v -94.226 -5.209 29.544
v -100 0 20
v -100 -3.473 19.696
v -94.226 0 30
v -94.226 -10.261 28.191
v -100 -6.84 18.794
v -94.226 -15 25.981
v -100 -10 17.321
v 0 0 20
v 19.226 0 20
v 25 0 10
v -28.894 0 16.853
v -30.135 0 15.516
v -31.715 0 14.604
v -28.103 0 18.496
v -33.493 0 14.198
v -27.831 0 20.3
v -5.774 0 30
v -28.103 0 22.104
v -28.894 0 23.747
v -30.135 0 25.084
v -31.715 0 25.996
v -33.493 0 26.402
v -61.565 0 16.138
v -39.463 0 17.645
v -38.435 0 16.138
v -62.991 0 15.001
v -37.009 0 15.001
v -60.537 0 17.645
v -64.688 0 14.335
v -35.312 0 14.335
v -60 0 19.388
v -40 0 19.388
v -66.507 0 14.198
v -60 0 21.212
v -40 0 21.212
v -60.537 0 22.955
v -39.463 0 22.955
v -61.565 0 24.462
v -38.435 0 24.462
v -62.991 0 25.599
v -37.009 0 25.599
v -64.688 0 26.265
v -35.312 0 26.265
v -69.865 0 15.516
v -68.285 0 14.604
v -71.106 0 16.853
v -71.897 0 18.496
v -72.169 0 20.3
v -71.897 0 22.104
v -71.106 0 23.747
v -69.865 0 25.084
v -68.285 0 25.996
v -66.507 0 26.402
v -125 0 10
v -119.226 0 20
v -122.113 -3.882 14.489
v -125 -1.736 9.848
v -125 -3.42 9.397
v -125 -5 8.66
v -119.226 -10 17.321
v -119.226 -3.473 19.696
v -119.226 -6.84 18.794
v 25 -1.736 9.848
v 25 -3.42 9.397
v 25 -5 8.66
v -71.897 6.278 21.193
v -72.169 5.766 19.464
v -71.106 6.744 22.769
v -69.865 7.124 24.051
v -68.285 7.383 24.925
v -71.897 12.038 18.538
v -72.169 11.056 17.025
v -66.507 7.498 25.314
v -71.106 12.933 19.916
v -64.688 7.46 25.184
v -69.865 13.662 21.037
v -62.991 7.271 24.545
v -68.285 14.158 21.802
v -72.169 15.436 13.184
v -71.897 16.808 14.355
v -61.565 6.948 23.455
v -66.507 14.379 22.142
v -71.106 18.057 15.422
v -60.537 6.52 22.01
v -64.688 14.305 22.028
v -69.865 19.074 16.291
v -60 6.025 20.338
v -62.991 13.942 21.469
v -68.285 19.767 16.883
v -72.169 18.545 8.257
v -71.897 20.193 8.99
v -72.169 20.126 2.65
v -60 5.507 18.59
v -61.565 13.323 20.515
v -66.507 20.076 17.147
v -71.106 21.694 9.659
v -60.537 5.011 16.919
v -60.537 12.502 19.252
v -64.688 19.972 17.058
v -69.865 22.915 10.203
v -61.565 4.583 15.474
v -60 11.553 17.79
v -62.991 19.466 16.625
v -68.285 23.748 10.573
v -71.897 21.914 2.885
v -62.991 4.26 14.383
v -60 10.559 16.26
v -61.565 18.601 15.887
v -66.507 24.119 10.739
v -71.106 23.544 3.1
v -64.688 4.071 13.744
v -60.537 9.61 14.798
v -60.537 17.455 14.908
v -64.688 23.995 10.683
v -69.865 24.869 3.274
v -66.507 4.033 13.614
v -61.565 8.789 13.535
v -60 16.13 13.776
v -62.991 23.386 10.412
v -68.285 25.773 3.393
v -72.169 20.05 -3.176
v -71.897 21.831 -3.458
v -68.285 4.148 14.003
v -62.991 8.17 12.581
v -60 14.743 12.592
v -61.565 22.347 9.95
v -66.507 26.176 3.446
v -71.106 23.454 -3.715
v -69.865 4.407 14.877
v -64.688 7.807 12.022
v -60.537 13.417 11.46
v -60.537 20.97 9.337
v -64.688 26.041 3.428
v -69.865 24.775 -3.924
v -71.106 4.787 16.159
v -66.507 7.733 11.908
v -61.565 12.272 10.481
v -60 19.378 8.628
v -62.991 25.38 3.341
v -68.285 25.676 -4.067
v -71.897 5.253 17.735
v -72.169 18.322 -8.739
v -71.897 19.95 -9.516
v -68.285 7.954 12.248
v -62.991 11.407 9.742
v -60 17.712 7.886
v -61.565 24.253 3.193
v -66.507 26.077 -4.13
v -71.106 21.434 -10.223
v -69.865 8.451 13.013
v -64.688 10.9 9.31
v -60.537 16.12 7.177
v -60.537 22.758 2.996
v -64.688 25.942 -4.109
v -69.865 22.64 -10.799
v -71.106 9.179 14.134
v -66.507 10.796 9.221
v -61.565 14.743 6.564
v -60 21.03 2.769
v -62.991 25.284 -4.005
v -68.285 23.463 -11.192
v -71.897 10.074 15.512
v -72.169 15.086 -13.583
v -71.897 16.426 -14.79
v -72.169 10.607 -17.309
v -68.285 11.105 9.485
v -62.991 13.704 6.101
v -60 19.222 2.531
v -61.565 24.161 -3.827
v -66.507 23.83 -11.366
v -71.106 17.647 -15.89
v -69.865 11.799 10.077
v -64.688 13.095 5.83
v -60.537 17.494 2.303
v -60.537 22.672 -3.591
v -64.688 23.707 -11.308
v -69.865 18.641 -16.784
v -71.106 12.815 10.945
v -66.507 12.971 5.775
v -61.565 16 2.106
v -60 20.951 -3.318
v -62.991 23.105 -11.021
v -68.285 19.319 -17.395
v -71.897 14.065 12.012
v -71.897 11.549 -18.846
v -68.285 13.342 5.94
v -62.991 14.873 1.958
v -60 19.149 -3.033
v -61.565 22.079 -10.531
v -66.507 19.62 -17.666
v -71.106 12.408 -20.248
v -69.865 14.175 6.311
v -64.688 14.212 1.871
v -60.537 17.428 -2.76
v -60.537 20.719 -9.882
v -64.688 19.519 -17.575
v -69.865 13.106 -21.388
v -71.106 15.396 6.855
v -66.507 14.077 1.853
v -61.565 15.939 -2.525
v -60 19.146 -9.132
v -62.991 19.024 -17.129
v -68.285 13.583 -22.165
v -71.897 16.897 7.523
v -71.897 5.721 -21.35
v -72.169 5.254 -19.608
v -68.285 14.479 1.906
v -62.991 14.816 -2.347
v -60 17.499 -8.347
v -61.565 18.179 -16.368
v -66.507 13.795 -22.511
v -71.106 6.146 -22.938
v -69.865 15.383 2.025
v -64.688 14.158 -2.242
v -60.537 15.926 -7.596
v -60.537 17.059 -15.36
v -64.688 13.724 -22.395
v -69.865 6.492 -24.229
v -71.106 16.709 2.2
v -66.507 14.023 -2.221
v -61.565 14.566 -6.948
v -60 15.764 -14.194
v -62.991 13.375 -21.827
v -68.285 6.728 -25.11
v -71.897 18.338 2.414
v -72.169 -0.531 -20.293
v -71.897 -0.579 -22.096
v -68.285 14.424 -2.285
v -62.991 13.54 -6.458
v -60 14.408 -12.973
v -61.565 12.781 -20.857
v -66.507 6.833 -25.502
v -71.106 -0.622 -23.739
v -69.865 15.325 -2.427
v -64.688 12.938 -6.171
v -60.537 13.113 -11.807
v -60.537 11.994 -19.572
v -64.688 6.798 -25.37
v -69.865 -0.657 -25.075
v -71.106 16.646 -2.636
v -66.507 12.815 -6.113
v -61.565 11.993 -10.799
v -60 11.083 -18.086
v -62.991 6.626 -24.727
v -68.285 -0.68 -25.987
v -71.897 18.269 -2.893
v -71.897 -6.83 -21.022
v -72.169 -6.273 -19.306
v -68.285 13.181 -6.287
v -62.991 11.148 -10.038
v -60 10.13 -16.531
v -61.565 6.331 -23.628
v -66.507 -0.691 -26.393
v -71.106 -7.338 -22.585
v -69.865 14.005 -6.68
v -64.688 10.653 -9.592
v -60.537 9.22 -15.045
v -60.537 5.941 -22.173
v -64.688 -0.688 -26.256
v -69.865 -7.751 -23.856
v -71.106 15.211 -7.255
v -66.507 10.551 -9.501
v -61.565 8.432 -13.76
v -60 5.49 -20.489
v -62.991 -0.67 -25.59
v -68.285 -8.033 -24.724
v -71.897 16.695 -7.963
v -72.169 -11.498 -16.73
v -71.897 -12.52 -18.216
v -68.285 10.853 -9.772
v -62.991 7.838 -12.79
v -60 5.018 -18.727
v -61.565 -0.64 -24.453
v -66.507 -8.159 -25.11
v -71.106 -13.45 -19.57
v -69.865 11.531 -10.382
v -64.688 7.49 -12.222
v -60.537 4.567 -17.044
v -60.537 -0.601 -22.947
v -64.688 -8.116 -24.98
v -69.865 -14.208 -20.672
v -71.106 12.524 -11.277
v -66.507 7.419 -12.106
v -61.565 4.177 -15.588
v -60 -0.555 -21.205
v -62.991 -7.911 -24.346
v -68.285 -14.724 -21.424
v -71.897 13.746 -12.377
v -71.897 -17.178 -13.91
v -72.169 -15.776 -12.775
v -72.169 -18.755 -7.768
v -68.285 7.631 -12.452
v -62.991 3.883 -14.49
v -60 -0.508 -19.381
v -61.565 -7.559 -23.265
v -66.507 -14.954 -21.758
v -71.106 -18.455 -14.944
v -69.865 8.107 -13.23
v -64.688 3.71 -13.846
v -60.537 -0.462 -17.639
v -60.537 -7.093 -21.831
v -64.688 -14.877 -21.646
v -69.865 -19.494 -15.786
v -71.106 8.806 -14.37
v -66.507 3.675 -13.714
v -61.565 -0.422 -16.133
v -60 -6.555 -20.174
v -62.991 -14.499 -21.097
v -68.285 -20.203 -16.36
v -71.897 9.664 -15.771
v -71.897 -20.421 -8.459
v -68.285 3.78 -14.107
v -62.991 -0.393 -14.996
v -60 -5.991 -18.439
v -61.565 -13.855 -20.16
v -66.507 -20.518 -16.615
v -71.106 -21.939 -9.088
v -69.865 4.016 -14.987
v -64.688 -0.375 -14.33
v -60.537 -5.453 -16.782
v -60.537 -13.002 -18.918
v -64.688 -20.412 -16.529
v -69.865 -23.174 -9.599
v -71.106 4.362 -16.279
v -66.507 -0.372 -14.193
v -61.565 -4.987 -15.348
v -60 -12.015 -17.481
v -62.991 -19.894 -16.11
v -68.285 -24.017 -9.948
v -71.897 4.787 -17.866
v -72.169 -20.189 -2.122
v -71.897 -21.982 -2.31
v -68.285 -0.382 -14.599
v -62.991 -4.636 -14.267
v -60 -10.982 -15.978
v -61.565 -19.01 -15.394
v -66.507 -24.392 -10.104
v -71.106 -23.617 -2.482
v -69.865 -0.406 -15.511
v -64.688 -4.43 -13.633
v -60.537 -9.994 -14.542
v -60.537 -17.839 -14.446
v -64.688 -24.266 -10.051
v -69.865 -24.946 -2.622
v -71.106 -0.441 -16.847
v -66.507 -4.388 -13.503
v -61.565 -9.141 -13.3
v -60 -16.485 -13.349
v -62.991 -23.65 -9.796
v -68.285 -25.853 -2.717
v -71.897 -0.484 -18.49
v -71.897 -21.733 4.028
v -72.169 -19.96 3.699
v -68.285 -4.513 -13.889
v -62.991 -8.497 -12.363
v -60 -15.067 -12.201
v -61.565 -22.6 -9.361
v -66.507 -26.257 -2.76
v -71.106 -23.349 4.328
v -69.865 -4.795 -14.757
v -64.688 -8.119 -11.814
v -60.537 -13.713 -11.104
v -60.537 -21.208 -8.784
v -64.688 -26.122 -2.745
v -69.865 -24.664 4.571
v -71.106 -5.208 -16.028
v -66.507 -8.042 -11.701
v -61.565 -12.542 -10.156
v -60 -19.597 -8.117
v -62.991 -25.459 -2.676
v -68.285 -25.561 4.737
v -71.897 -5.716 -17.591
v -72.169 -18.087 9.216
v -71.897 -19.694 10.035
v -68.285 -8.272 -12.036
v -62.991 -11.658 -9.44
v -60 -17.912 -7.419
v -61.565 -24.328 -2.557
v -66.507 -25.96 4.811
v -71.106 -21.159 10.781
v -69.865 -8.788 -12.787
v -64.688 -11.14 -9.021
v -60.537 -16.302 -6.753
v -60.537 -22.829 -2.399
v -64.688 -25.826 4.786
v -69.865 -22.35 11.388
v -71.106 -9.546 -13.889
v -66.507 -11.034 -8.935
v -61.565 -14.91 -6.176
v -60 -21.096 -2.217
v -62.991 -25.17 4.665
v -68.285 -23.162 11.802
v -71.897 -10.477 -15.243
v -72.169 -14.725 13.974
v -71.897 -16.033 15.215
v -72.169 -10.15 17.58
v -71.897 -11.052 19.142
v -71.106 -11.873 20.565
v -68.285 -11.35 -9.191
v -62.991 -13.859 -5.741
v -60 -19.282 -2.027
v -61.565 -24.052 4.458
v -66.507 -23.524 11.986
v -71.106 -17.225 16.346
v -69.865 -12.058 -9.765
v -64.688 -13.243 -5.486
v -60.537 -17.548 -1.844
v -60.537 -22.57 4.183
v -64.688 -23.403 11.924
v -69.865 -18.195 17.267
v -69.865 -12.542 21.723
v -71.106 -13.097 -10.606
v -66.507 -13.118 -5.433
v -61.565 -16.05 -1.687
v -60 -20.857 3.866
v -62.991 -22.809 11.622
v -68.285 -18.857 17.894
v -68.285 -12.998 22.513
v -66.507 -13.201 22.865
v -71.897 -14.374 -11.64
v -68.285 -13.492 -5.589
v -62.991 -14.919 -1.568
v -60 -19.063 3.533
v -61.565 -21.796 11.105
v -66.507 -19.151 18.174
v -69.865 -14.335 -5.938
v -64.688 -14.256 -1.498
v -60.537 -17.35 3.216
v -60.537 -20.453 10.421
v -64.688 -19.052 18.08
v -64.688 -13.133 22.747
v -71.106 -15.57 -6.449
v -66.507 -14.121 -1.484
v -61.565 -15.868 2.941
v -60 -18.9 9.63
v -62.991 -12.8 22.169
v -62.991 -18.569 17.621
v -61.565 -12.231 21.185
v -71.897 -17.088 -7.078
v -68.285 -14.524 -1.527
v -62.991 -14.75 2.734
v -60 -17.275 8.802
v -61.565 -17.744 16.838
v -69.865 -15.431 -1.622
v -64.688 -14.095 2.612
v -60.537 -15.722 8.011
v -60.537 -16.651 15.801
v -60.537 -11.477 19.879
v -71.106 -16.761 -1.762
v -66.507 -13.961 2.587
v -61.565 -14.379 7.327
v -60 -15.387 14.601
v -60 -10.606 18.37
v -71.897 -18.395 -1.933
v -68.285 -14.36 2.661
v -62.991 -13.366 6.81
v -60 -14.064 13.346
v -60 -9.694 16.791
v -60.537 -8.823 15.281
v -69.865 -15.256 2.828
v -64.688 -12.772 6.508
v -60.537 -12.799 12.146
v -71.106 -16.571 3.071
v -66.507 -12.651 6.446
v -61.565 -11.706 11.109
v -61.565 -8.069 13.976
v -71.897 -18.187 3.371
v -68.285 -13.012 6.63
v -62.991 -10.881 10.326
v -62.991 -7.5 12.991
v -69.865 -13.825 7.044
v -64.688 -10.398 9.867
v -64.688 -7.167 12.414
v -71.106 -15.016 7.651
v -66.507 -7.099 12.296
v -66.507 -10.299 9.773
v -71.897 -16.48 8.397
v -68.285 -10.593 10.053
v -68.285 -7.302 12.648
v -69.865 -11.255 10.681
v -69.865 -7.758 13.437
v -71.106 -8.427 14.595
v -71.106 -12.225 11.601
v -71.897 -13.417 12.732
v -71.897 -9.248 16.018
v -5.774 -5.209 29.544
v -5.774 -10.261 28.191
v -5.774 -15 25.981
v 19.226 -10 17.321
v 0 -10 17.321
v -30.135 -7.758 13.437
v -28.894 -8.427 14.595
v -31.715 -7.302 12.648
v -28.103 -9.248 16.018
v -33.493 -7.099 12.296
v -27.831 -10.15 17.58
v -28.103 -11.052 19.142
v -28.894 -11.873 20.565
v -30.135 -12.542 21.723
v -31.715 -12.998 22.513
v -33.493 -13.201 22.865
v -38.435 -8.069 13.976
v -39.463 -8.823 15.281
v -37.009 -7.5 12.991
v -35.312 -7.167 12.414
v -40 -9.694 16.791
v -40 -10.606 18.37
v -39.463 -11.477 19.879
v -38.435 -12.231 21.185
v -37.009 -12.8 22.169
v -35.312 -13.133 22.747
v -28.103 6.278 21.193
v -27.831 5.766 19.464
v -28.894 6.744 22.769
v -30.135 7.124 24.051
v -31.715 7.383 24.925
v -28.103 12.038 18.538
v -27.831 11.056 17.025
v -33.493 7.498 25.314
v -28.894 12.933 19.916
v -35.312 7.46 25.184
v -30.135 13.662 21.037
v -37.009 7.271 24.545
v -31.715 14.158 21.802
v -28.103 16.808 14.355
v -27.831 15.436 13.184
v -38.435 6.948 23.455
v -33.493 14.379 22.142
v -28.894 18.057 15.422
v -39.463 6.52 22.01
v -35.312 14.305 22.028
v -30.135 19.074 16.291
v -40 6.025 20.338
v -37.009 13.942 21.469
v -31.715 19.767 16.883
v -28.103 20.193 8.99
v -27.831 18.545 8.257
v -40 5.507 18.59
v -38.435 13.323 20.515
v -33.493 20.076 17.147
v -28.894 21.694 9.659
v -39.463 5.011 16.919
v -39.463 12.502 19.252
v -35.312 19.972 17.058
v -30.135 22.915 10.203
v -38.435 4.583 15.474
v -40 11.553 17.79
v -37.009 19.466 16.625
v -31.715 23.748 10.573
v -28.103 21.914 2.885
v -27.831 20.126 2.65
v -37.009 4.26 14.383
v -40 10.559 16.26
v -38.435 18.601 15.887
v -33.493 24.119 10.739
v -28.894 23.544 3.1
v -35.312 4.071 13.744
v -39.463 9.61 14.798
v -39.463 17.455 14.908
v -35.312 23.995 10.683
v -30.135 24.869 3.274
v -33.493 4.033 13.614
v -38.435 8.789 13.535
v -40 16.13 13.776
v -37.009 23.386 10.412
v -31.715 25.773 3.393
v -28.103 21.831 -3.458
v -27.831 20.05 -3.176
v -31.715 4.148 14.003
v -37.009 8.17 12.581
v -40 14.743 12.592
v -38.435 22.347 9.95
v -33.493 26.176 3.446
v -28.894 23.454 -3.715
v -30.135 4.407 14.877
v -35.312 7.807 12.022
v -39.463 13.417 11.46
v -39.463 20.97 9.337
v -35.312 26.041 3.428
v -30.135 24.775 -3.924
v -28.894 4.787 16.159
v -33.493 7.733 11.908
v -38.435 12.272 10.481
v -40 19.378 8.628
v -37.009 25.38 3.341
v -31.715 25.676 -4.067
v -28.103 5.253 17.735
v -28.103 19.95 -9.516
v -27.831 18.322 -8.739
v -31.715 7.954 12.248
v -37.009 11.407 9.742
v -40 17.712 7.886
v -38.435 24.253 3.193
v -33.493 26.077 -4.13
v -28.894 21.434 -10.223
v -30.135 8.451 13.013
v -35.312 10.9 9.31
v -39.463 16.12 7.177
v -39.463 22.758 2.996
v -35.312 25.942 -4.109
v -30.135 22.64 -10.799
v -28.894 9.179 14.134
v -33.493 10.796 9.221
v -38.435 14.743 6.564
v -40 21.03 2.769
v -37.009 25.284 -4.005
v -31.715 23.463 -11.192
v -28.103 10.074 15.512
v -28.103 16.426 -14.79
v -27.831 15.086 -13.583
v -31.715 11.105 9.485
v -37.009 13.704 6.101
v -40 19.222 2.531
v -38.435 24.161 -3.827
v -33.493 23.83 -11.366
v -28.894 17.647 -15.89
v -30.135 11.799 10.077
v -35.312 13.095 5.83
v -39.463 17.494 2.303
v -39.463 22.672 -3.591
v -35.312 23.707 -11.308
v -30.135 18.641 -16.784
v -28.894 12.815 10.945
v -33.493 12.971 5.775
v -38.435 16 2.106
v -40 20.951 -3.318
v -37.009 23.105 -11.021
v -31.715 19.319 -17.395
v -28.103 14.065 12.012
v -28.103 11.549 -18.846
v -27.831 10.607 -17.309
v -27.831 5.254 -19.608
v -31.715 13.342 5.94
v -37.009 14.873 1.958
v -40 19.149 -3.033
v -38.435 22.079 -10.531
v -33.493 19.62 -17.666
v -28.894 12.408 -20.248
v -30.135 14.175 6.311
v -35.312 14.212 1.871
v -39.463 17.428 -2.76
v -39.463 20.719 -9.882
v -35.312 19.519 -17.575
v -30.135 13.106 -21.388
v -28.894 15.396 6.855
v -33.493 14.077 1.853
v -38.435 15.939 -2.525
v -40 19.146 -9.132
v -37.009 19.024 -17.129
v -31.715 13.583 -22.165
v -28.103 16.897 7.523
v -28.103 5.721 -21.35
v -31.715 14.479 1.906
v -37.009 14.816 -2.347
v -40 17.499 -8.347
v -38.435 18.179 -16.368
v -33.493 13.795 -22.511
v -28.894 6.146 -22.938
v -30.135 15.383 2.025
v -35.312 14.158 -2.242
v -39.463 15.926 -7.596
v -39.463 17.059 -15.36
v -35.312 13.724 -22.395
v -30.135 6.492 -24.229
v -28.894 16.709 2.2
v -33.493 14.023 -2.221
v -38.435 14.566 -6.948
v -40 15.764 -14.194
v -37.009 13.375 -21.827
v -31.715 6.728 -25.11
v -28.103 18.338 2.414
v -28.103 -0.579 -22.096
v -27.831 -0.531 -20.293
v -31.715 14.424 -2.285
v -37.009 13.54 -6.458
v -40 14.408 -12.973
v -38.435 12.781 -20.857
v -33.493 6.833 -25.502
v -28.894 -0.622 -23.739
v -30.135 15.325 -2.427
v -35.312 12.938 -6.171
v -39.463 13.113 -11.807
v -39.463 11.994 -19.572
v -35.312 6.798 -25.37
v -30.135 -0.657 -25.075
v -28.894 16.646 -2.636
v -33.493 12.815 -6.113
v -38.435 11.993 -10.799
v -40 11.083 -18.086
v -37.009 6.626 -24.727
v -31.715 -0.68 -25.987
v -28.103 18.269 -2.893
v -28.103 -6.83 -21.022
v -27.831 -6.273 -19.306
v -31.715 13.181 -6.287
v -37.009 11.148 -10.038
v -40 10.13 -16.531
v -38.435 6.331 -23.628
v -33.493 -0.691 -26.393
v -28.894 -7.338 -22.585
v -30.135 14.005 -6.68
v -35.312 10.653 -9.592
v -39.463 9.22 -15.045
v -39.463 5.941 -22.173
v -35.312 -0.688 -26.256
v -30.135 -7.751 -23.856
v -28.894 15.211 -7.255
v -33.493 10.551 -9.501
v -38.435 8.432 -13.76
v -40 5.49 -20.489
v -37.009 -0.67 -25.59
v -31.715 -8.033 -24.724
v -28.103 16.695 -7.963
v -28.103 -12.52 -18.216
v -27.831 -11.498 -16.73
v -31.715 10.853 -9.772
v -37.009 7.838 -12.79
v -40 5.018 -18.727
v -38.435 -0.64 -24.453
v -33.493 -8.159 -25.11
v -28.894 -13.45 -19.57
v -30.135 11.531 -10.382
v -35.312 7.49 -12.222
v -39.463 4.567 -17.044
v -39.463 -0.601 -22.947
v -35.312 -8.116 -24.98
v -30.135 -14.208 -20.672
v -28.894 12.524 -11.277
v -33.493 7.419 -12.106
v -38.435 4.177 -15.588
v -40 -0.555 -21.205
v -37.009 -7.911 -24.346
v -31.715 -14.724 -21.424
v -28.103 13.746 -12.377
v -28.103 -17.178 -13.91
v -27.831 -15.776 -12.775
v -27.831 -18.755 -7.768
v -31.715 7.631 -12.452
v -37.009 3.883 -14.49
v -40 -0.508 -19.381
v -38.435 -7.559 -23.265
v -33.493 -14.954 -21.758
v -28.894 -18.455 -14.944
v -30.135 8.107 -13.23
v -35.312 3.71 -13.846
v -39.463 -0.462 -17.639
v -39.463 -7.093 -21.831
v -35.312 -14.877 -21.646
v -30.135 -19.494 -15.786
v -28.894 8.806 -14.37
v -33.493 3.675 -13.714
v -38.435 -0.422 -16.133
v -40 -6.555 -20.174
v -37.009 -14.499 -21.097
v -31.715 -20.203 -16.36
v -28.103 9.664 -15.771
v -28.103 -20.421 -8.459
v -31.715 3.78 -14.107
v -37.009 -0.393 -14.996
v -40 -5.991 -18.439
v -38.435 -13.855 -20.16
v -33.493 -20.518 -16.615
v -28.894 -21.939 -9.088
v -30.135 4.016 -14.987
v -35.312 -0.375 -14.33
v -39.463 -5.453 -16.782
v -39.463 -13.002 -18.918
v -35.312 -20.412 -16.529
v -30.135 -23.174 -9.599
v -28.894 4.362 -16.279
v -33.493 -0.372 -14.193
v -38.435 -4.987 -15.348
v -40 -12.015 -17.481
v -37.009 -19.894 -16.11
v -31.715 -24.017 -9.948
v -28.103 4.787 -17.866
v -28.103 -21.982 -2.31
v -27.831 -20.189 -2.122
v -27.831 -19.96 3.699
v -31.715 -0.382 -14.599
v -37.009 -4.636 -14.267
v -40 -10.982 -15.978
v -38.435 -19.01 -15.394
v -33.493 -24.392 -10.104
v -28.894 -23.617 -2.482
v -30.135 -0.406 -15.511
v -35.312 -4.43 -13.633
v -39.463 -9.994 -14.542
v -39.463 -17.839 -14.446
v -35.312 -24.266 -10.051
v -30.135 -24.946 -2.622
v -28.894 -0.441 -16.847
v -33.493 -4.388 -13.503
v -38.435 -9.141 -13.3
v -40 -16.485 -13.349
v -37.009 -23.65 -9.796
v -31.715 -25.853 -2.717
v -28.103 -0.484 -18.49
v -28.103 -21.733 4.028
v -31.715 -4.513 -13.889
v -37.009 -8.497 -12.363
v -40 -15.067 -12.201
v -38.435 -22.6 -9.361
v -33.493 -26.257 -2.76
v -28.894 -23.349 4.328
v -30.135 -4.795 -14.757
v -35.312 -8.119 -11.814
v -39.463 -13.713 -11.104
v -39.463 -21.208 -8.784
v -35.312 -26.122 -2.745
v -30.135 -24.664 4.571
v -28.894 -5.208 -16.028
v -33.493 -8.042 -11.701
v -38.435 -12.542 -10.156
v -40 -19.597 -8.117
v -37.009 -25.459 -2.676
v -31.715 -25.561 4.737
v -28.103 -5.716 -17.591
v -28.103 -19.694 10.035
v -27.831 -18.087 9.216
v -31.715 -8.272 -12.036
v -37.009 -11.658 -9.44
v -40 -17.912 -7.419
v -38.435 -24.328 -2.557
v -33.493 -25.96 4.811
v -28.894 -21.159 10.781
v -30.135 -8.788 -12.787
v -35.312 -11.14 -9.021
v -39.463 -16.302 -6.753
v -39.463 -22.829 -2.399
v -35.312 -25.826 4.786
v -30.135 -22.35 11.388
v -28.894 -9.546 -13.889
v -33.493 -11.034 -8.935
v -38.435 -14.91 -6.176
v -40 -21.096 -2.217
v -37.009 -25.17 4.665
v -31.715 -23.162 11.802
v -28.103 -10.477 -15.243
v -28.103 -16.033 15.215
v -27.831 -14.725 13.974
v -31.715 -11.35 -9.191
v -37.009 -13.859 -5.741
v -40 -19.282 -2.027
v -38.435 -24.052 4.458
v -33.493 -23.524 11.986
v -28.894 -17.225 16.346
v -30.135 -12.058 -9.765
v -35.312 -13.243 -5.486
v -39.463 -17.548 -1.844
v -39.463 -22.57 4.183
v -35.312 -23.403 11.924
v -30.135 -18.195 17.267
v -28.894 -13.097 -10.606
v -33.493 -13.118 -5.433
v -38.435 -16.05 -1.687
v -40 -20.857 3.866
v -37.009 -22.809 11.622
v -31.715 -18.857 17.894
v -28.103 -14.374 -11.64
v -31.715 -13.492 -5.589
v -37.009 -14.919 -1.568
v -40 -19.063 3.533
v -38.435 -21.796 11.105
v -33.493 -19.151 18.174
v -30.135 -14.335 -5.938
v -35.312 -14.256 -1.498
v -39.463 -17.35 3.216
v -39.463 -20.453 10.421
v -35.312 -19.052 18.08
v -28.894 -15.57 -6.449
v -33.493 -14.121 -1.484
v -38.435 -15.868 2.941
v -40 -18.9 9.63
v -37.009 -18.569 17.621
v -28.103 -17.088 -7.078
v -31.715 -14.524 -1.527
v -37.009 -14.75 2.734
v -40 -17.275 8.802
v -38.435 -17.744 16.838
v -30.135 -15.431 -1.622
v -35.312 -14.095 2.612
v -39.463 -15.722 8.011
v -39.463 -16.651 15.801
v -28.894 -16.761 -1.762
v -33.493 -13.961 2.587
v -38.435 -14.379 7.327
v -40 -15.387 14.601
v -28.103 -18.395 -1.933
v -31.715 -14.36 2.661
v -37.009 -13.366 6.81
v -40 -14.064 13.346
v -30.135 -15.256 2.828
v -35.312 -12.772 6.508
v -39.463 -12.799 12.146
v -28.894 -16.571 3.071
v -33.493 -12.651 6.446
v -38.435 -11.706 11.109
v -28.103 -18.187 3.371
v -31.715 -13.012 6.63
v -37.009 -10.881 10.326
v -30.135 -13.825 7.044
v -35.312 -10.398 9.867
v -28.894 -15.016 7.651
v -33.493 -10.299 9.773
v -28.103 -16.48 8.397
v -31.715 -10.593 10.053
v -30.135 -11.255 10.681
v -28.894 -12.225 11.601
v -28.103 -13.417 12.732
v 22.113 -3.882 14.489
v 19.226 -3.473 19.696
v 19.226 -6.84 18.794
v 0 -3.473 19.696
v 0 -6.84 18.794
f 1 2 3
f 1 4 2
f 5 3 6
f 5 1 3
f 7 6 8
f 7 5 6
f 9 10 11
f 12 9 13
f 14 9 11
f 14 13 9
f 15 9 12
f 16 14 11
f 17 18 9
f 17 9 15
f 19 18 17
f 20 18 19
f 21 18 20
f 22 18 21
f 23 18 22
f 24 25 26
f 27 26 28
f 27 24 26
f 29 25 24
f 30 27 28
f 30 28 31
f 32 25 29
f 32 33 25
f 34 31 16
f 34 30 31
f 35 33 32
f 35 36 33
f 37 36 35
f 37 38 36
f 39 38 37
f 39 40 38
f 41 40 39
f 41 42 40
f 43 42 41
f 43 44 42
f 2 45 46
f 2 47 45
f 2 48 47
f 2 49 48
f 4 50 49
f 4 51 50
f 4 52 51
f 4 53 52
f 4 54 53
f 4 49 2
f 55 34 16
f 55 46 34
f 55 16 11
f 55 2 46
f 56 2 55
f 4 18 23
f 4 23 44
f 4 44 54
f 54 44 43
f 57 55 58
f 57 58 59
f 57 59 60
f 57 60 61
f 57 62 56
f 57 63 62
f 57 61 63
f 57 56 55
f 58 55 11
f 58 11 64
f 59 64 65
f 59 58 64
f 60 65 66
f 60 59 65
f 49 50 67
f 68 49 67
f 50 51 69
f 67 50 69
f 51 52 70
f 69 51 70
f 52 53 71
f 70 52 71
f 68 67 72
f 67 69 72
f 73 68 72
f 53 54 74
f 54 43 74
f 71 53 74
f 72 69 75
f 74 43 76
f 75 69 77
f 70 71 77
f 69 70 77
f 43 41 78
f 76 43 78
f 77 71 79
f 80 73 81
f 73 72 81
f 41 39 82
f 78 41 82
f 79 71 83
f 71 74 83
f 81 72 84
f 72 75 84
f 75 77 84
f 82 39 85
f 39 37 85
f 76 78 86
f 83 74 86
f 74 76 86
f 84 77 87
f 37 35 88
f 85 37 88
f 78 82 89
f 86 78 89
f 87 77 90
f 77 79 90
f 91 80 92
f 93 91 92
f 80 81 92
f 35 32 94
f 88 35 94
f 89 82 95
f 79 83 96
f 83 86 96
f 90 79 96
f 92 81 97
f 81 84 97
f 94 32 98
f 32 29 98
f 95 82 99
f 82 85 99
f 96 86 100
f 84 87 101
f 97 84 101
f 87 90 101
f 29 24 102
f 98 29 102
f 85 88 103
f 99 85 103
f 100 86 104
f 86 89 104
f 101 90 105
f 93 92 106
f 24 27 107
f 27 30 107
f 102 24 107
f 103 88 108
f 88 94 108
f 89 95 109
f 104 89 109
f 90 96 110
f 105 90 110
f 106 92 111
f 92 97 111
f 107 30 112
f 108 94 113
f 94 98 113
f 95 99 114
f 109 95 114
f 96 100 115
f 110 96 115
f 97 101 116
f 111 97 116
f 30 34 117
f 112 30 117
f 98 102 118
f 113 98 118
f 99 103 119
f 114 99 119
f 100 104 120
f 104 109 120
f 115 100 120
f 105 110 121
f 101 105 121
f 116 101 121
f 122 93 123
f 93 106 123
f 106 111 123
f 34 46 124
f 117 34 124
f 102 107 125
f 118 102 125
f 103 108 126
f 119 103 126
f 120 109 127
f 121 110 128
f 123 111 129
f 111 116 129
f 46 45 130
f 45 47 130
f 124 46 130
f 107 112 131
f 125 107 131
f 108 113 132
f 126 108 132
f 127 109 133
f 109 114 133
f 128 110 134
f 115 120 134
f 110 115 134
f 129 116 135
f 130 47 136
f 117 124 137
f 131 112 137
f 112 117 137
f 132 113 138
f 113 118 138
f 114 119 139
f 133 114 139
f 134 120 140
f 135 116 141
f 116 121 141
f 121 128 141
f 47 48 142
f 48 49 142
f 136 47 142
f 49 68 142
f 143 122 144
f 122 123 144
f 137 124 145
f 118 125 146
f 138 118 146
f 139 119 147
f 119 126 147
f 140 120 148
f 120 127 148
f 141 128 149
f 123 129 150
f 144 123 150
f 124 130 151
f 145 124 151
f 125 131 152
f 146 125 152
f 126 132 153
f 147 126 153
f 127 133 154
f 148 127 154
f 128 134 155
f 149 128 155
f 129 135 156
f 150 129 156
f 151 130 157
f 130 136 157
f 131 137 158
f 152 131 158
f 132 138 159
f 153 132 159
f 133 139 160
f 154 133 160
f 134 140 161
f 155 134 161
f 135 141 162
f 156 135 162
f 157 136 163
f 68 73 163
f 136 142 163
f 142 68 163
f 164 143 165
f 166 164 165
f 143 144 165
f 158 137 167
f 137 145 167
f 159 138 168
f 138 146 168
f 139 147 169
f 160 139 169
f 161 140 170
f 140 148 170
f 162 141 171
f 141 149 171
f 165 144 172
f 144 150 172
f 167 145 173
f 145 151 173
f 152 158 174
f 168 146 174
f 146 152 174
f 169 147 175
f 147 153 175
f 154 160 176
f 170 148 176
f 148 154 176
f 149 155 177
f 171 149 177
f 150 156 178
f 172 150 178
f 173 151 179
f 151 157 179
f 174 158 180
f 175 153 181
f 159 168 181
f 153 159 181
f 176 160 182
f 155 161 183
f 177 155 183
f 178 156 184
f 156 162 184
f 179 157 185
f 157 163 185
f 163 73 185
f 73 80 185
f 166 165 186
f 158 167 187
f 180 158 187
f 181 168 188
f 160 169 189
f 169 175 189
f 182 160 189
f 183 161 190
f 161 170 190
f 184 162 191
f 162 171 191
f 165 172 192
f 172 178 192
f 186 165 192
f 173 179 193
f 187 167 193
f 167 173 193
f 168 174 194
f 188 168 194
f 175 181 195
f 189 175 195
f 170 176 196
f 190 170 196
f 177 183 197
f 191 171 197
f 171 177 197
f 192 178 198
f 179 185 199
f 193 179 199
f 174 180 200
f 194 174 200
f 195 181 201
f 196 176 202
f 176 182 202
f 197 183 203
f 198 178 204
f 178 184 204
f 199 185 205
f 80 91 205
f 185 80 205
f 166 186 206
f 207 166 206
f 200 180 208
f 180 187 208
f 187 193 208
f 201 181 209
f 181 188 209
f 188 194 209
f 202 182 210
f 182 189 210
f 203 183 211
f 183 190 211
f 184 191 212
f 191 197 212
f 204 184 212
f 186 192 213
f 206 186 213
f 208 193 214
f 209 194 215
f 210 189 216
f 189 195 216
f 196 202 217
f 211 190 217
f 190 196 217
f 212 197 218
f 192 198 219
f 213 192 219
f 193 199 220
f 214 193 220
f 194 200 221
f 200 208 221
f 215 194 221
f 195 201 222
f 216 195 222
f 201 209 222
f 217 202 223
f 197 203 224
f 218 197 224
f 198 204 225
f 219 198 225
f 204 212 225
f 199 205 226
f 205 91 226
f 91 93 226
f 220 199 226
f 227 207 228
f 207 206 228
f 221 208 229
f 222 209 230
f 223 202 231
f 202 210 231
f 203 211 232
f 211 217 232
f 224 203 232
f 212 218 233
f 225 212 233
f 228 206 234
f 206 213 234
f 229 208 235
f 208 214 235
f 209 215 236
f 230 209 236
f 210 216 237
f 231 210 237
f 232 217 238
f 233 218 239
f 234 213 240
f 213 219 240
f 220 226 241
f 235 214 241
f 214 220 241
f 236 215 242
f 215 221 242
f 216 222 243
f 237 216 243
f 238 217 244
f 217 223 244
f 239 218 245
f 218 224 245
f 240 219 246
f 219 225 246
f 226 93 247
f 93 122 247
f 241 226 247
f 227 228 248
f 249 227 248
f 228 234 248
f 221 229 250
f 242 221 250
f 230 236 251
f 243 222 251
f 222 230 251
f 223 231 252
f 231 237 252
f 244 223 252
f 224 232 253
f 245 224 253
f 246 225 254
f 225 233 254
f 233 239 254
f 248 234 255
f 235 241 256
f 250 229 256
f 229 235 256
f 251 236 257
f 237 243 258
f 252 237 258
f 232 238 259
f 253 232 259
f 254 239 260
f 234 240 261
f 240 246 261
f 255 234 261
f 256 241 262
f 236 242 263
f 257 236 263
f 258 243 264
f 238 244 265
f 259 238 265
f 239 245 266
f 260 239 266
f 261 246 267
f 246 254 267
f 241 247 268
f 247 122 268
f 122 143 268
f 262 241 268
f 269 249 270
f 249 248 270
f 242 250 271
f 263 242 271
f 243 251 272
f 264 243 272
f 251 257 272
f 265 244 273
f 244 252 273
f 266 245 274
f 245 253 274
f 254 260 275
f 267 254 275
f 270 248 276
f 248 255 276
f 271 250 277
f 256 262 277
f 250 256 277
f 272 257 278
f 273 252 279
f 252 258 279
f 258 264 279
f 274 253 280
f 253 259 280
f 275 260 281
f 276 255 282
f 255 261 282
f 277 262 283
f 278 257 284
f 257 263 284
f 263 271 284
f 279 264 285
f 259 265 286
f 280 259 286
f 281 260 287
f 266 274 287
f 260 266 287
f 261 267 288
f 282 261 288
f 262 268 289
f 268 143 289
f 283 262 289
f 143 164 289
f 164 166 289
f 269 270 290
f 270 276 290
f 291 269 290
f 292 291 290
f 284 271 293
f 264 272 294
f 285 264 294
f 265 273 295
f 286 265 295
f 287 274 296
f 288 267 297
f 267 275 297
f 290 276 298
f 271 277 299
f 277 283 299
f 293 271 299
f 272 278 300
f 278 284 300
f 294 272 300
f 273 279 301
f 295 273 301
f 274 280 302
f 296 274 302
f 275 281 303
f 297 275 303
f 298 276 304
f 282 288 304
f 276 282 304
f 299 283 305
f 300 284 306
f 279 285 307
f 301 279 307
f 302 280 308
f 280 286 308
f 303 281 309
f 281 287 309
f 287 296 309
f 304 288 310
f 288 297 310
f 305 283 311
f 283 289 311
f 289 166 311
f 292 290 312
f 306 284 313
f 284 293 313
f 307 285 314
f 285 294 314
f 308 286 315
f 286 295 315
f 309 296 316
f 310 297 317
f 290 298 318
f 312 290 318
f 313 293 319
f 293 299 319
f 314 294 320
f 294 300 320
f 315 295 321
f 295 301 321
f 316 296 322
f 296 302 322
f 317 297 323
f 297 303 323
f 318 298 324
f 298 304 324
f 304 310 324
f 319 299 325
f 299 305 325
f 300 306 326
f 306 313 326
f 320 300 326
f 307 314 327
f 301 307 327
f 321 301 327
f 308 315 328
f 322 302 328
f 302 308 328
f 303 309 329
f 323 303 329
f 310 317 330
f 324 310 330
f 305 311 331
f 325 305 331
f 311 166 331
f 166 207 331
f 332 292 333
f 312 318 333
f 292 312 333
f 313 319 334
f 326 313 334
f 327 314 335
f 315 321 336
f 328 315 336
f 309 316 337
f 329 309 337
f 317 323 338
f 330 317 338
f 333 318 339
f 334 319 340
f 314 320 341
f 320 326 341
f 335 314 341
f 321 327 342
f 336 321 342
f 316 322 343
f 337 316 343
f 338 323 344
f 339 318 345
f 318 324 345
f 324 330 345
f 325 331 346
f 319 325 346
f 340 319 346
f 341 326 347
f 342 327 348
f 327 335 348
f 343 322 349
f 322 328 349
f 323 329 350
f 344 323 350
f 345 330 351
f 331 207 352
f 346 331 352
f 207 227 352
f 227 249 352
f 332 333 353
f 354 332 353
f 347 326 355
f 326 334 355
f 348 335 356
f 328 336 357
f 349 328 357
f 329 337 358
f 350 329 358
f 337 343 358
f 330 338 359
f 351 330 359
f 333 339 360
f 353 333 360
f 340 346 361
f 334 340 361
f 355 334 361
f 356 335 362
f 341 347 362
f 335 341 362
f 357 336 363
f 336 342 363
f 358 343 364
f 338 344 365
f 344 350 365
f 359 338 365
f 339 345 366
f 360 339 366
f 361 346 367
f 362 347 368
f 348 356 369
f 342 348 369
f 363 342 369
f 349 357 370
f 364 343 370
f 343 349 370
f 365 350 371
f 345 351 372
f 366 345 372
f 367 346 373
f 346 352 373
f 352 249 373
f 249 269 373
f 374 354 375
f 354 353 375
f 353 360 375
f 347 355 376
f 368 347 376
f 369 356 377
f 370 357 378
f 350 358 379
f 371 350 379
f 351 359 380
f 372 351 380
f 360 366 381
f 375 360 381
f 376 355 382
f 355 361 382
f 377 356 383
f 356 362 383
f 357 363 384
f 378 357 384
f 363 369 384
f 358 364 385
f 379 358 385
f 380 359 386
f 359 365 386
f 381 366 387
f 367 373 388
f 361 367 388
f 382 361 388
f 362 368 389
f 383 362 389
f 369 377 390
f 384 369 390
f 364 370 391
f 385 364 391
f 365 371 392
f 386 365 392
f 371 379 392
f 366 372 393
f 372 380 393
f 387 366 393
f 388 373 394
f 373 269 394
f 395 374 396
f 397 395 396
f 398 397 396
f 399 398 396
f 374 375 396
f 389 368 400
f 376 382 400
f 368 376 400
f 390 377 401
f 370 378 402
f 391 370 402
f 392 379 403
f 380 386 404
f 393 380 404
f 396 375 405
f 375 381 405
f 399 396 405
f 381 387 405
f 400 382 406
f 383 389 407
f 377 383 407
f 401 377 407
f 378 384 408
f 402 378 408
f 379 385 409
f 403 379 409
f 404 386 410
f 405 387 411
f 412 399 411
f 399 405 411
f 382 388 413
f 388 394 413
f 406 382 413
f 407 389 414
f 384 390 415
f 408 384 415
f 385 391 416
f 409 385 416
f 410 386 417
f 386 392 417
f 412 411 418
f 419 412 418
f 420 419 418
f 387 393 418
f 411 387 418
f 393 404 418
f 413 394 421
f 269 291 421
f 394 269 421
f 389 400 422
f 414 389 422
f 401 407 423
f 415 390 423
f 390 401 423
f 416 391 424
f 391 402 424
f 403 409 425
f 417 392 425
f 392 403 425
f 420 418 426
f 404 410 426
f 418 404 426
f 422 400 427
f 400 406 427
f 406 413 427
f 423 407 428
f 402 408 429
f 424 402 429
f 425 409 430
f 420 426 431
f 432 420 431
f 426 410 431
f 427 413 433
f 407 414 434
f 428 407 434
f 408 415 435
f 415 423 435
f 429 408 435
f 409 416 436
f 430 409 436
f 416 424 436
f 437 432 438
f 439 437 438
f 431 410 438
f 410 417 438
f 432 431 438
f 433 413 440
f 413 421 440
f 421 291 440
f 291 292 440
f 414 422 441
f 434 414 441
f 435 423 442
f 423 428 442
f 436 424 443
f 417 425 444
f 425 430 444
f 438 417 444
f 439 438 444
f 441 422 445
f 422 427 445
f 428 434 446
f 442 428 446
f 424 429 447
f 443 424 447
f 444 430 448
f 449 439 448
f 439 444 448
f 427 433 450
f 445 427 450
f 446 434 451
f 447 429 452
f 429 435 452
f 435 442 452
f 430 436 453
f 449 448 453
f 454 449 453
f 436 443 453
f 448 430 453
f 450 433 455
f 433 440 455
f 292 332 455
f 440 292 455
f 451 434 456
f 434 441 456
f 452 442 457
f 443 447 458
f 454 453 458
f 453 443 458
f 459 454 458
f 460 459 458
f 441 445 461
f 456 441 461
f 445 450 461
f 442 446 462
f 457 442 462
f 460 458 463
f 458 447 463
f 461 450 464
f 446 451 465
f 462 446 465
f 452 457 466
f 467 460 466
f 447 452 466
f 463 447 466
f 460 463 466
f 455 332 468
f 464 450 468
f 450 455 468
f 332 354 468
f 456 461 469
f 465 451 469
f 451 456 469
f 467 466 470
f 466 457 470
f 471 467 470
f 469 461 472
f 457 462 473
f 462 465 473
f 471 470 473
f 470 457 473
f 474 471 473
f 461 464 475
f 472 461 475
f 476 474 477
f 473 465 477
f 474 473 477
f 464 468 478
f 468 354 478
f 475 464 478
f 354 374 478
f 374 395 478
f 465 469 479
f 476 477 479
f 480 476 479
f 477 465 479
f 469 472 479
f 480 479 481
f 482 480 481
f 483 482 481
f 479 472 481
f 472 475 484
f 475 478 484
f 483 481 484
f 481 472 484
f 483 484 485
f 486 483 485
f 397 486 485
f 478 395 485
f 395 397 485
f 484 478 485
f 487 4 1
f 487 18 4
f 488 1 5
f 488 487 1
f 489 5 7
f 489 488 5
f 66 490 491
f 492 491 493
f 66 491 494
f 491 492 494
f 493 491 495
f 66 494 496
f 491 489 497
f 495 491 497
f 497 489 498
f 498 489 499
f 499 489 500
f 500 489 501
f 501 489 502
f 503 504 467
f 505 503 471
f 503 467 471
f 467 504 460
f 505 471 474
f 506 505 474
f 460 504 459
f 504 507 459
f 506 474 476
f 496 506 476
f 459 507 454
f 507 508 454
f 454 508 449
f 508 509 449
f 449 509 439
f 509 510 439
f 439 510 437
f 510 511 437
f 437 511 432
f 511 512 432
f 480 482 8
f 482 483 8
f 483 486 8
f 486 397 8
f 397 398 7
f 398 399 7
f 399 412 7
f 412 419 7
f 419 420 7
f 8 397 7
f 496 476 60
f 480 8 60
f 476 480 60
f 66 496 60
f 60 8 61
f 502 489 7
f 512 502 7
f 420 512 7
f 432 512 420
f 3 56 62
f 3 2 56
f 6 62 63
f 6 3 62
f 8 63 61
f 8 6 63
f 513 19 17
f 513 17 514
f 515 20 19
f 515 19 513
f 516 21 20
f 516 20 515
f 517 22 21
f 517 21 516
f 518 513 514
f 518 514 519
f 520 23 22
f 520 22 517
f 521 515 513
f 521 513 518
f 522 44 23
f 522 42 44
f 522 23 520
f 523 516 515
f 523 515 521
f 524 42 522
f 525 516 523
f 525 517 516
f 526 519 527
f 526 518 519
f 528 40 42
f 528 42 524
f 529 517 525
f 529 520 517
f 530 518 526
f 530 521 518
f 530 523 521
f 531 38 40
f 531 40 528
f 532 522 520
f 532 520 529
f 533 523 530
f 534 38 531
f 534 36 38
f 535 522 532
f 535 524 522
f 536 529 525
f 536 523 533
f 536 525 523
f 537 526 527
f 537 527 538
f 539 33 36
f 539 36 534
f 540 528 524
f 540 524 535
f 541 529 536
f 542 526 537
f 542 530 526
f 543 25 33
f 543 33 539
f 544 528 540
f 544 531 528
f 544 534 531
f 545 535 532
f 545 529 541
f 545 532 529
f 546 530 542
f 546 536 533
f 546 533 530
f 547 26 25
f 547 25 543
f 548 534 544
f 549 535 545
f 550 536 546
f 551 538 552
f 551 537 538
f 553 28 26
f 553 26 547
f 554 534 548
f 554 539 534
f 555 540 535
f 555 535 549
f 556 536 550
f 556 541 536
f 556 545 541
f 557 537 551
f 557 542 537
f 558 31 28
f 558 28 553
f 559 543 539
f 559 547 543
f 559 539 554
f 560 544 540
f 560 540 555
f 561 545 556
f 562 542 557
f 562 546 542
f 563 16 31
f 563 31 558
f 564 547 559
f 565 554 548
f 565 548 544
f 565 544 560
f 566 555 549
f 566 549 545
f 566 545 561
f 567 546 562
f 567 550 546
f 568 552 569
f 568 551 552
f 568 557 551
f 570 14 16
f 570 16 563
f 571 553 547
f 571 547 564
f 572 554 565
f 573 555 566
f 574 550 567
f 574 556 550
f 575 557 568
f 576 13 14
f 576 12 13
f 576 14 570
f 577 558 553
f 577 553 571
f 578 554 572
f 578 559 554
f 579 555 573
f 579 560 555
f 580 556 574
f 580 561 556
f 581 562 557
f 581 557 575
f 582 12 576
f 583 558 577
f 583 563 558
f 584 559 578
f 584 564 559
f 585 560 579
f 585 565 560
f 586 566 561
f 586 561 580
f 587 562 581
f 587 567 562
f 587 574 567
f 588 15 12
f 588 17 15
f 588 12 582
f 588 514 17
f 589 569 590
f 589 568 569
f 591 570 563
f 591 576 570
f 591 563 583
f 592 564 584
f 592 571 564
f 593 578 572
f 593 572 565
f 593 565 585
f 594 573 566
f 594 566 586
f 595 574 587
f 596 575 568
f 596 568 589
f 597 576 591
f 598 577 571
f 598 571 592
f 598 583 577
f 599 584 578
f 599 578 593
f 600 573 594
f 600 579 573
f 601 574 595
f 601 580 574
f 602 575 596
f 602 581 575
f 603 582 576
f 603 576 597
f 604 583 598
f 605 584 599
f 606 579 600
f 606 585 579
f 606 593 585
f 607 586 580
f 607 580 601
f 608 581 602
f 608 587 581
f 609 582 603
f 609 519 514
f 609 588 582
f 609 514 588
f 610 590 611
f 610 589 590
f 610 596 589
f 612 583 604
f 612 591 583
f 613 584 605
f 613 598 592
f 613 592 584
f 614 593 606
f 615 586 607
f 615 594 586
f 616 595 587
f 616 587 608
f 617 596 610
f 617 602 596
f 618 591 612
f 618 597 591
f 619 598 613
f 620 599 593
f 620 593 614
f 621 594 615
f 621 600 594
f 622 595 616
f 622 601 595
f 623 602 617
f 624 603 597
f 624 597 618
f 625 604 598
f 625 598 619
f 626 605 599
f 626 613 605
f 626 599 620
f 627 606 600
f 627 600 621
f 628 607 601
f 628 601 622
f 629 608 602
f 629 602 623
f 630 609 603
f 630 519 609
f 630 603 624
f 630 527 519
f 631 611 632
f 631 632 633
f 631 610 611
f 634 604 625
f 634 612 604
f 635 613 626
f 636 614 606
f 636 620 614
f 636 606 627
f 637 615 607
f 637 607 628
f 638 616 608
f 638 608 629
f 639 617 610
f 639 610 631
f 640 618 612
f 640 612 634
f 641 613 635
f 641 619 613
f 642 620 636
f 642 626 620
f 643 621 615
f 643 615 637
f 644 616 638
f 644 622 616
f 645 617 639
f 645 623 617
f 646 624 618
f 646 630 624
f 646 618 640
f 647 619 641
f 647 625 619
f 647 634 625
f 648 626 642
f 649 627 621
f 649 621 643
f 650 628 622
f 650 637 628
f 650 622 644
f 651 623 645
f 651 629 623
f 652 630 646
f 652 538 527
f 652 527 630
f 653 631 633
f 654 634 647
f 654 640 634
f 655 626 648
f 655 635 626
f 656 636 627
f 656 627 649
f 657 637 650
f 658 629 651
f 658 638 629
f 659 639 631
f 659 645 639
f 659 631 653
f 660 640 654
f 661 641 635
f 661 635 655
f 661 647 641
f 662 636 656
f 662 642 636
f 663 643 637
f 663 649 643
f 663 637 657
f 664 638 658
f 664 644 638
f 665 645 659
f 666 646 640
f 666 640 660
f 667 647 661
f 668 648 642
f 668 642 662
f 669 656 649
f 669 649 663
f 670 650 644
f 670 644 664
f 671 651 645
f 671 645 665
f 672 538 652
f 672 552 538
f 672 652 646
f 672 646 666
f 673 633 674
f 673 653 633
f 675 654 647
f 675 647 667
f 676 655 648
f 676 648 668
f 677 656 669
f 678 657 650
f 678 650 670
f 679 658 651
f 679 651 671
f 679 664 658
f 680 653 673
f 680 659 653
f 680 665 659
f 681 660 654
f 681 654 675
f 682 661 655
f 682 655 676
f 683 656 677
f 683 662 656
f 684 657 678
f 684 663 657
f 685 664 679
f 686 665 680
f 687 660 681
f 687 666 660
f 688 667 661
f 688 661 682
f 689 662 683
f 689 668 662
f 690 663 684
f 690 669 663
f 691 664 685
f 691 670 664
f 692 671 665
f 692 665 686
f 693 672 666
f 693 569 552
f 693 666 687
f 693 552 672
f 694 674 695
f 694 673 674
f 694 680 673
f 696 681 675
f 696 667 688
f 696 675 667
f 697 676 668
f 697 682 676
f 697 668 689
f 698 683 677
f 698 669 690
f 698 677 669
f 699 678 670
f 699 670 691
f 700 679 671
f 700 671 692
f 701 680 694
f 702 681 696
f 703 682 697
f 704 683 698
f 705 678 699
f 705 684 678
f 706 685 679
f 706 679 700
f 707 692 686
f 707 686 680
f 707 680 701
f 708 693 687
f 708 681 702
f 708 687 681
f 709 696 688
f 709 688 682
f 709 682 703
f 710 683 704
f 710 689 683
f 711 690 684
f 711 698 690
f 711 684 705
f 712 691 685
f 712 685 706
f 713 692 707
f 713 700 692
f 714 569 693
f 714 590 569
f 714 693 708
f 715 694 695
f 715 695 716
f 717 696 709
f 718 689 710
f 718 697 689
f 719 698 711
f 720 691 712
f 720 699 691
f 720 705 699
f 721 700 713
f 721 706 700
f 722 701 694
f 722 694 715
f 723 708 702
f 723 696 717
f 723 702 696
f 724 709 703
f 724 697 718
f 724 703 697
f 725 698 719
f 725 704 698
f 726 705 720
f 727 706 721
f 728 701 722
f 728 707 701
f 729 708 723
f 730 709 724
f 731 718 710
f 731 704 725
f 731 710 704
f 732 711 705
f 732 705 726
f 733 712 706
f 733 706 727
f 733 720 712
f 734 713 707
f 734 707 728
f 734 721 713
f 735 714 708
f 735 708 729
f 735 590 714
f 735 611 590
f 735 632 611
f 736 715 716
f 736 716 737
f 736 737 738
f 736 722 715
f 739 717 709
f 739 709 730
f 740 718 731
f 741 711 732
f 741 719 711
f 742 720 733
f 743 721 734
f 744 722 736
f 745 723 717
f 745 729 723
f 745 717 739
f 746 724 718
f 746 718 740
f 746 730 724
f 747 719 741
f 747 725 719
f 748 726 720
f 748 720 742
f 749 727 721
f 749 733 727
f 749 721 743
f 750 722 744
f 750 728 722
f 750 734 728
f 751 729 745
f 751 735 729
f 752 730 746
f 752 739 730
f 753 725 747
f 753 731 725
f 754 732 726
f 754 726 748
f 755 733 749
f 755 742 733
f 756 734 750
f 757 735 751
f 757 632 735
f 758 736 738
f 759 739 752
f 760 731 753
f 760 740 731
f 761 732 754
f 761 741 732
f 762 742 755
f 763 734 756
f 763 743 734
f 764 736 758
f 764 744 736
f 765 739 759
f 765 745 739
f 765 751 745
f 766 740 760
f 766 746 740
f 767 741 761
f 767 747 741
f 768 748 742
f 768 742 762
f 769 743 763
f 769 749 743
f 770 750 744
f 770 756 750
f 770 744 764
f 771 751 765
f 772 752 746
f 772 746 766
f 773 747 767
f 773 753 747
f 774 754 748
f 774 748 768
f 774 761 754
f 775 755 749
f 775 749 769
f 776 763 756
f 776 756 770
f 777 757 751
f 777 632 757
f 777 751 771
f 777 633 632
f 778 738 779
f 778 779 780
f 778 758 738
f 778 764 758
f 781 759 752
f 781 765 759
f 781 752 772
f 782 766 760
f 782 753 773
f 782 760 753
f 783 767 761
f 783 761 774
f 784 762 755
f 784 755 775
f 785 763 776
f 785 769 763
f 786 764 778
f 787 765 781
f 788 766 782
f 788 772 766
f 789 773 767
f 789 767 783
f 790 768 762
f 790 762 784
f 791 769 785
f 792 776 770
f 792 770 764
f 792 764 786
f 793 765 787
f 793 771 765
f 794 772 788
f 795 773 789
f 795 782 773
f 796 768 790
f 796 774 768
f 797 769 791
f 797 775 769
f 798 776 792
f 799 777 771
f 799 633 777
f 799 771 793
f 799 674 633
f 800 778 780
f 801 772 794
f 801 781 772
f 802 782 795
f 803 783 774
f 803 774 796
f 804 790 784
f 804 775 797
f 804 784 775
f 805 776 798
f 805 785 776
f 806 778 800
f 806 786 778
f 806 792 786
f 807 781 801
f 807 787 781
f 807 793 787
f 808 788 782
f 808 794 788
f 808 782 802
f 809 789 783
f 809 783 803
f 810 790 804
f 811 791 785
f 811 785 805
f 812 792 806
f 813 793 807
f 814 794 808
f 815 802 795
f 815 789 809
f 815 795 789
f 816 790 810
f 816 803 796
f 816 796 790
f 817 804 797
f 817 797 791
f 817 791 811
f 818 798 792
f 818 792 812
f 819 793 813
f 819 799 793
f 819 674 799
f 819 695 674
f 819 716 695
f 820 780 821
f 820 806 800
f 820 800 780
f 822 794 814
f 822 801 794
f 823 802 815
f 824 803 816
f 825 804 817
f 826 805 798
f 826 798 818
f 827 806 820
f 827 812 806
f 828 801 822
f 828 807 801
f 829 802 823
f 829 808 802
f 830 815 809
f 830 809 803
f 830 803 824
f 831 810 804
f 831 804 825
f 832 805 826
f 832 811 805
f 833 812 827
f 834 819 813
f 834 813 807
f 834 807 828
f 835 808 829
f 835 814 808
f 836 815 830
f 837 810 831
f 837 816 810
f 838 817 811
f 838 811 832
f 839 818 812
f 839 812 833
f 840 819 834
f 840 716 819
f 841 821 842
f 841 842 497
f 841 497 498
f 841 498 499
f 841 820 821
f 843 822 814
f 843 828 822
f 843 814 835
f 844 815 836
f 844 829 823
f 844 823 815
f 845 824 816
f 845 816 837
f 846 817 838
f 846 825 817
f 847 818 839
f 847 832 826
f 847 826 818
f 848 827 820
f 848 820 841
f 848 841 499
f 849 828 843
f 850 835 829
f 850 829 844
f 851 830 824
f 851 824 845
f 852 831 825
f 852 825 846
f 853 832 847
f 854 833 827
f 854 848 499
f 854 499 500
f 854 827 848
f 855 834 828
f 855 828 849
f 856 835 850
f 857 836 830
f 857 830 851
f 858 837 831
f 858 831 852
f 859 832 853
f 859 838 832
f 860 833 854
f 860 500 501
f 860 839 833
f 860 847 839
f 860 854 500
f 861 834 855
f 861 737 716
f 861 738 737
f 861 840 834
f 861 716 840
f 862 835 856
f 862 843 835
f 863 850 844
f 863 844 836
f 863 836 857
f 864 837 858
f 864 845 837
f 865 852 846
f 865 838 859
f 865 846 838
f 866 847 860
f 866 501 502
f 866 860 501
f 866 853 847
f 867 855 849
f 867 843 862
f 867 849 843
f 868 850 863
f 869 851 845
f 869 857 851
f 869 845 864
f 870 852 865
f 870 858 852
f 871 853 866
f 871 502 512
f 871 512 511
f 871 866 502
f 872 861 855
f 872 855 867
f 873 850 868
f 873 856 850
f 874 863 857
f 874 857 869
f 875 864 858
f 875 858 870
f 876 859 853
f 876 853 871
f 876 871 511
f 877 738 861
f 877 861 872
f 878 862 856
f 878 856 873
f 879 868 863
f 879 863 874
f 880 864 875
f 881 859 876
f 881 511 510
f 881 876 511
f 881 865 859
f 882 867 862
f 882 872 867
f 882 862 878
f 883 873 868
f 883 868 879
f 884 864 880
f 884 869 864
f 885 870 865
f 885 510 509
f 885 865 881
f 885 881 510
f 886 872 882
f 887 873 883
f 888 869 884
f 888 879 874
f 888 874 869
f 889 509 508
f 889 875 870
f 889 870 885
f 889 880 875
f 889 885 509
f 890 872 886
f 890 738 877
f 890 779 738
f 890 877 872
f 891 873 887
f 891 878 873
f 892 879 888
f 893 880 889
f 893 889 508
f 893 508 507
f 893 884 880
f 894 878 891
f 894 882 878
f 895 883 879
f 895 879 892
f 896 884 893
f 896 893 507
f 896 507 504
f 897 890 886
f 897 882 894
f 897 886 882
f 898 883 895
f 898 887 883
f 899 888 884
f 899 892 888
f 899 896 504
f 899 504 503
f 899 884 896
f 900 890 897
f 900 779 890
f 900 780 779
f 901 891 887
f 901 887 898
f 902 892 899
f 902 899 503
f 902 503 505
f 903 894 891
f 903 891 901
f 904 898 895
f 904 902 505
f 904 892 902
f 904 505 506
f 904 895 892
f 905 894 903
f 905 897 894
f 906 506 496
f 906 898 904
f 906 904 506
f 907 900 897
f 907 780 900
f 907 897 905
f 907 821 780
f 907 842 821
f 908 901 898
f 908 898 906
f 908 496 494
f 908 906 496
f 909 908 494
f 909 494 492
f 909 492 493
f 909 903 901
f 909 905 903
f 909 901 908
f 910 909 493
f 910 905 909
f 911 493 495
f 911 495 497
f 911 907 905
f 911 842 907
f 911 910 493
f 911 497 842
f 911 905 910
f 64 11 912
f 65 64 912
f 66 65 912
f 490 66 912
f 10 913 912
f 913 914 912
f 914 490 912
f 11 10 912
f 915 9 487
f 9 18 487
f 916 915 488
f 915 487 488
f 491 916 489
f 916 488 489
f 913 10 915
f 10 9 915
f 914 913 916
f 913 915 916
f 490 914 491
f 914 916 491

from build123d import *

# Parameters (mm, degrees)
F1_ANGLE = 30
F2_R     = 6.118823


with BuildPart() as f1:
    # F0 (on Front) → F1 (revolve)
    with BuildSketch(Plane.XZ):
        Polygon((-5.773503, 30), (-50, 30), (-50, 10), (25, 10), (19.226497, 20), (0, 20), align=None)
    revolve(axis=Axis((-12.5, 0, 0), (1, 0, 0)), revolution_arc=F1_ANGLE)

    # F2 (on face) → F3 (revolve)
    with BuildSketch(Plane(origin=(0, 0, 0), x_dir=(1, 0, 0), z_dir=(0, -0.866025, -0.5))):
        with Locations((-33.949997, 20.300001)):
            Circle(F2_R)
    revolve(axis=Axis((5.200002, 0, 0), (-1, 0, 0)))

    # F4: F1 across face


with BuildPart() as f1_1:
    add(f1.part)
    add(f1.part.mirror(Plane(origin=(-50, -5.543907, 20.690143), x_dir=(0, -1, 0), z_dir=(-1, 0, 0))))


solid = f1_1.part
